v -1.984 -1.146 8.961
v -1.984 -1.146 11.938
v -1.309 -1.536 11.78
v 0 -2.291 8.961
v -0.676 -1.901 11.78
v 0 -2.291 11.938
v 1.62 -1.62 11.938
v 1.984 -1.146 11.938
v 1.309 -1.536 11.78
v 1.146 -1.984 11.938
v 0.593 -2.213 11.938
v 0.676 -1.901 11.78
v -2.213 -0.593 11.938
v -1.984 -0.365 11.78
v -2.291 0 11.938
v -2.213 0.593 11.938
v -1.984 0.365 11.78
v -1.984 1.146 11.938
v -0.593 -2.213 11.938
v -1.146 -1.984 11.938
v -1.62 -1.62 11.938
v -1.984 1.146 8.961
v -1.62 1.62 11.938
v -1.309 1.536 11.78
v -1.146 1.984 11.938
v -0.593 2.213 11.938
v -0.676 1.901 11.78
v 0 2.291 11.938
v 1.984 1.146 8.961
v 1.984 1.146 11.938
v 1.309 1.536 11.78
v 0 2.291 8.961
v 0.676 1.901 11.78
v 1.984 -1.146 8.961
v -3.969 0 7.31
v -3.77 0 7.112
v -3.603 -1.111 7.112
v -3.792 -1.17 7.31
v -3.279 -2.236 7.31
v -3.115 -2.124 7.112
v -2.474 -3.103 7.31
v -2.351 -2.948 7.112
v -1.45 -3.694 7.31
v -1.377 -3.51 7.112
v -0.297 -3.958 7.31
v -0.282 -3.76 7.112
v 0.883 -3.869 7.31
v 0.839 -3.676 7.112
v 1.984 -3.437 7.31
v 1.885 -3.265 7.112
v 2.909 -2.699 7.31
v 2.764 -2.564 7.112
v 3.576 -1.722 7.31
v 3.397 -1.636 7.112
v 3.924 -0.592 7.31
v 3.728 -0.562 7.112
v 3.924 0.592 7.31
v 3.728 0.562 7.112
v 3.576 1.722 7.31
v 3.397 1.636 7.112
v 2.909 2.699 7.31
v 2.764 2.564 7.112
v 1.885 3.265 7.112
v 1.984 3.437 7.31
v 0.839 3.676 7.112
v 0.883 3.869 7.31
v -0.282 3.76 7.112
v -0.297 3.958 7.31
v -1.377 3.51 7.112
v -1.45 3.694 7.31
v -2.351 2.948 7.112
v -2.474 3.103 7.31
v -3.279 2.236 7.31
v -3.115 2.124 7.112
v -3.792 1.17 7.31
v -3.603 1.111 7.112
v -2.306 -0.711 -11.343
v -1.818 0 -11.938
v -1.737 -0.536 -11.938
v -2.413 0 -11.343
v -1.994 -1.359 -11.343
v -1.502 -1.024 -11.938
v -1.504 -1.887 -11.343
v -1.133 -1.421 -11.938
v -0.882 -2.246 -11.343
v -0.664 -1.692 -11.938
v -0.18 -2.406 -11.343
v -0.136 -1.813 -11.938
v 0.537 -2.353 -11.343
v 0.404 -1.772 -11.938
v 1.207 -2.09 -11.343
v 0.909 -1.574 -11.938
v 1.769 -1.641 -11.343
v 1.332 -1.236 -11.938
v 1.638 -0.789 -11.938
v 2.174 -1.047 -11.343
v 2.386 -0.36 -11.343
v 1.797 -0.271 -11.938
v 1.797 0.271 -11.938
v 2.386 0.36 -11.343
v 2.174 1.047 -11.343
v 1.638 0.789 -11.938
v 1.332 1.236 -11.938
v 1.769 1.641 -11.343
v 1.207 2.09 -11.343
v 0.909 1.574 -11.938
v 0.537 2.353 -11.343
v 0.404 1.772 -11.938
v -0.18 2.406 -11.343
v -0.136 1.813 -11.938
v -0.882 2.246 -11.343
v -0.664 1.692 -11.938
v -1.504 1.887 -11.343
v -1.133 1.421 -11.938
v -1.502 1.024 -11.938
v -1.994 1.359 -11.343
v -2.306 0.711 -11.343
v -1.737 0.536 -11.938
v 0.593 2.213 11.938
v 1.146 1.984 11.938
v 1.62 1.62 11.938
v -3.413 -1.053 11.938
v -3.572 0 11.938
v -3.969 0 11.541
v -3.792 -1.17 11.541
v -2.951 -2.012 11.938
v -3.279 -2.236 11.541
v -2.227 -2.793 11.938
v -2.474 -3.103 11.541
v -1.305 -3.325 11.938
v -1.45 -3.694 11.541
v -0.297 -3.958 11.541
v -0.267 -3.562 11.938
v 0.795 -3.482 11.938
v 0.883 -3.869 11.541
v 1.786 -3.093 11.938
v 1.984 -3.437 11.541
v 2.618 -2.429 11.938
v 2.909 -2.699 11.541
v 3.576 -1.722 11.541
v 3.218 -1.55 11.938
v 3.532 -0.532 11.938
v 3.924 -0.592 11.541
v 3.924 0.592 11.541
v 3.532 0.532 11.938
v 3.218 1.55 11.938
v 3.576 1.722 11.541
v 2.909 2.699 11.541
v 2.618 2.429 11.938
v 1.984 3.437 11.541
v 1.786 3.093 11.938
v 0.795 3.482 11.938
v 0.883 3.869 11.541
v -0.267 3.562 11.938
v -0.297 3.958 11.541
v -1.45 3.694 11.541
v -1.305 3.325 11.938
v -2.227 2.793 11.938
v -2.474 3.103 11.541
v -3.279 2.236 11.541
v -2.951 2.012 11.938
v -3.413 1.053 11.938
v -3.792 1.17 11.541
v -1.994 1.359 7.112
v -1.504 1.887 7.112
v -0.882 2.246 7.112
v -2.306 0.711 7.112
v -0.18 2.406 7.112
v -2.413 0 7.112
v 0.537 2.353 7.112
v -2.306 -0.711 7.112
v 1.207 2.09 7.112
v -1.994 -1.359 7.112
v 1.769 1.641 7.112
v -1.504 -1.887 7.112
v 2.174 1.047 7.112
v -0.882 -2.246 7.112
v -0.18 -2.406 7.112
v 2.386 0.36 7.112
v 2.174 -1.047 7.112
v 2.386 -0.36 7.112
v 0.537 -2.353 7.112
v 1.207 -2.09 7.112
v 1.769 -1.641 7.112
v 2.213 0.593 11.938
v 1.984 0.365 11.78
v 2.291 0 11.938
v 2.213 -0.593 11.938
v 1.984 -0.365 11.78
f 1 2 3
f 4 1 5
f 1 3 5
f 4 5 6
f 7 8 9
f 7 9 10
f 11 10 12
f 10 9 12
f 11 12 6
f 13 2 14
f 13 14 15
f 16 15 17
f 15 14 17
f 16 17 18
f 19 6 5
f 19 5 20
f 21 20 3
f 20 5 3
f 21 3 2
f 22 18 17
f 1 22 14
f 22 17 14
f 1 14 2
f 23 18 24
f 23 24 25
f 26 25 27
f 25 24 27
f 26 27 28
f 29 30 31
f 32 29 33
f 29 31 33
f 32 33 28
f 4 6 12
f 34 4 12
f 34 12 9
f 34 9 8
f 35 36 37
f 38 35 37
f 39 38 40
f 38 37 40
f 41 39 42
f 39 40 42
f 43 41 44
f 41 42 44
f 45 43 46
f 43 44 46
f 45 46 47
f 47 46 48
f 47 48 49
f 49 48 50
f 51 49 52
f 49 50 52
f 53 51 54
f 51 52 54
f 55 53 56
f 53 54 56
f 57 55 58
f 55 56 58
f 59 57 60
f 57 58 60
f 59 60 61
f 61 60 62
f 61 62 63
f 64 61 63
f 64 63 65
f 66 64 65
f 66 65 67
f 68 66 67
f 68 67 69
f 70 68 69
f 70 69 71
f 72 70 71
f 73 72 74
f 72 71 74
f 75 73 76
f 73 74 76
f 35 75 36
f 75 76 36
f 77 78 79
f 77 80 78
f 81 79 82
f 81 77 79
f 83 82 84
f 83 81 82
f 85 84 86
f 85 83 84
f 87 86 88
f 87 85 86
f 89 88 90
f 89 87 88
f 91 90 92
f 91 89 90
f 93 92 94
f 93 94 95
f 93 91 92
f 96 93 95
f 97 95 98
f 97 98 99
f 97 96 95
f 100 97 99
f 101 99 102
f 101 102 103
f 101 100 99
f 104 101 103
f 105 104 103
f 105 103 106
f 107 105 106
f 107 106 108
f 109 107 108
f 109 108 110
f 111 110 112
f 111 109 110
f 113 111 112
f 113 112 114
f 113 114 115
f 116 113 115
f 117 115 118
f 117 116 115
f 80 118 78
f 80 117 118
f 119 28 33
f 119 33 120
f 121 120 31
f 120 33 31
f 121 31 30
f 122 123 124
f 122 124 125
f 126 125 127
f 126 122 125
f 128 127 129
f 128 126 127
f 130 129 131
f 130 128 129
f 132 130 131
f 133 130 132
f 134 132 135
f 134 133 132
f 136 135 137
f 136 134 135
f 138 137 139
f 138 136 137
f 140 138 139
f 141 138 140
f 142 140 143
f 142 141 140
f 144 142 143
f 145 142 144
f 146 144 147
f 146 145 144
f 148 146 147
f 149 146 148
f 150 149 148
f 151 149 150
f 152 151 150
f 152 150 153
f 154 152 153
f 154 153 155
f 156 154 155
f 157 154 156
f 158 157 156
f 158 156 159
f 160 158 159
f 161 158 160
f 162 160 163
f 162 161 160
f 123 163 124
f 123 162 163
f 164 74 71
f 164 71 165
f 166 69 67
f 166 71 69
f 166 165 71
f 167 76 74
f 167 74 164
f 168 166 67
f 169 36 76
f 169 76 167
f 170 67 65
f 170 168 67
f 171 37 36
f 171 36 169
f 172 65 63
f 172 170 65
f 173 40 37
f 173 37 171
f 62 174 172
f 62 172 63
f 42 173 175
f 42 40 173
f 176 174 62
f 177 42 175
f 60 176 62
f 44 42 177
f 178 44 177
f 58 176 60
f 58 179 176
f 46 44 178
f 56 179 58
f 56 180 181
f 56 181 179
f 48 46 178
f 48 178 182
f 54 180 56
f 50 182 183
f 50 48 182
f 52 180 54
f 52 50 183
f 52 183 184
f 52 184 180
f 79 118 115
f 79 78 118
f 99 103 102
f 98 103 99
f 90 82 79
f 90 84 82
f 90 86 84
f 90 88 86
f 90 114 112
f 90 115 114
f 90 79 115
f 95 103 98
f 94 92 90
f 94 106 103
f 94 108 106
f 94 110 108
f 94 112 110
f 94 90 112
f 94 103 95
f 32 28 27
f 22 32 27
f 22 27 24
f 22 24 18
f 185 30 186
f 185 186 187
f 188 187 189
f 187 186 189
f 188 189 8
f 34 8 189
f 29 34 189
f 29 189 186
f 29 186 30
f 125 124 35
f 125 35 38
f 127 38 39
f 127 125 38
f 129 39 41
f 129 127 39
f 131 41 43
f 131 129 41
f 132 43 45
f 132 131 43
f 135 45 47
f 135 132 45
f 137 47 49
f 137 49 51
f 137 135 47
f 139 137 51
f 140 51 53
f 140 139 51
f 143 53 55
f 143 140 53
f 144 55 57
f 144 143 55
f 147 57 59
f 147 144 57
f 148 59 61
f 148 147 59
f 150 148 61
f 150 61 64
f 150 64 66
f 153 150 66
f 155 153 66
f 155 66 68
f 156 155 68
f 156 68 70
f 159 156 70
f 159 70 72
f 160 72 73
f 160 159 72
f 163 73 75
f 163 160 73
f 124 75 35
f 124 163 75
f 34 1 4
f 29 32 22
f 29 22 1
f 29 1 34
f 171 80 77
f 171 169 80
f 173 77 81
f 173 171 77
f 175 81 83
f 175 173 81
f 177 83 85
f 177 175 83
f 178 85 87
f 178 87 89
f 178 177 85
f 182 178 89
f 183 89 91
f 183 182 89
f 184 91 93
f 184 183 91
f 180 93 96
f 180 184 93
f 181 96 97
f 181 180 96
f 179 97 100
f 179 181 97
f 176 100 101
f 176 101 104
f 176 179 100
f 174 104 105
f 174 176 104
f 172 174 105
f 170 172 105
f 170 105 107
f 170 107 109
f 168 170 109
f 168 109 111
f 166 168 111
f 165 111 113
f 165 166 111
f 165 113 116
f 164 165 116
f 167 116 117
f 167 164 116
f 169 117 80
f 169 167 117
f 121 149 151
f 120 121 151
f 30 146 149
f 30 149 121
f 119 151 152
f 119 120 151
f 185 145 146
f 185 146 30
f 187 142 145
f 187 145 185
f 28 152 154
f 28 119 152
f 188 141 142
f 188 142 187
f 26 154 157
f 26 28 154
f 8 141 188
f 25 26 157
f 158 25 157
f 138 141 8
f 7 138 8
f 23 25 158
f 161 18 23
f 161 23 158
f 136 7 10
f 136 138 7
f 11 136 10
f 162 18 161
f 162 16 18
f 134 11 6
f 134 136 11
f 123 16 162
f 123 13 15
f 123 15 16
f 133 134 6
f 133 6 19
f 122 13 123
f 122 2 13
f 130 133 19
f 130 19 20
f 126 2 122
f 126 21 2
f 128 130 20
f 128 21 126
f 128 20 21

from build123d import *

# Parameters (mm, degrees)
CUT_EXTRUDE1_DEPTH = 2.9765625
CHAMFER1_SIZE      = 0.396875
CHAMFER2_SIZE      = 0.1984375


with BuildPart() as part:
    # Sketch2 → Revolve1 (revolve)
    with BuildSketch(Plane(origin=(0, 0, 0), x_dir=(0, 0, -1), z_dir=(1, 0, 0))):
        Polygon((11.938, 1.8176875), (11.3426875, 2.413), (-7.112, 2.413), (-7.112, 3.96875), (-11.938, 3.96875), (-11.938, 0), (11.938, 0), align=None)
    revolve(axis=Axis((0, 0, -11.938), (0, 0, 1)))

    # Sketch4 → Cut-Extrude1 (cut)
    with BuildSketch(Plane.XY.offset(11.938)):
        Polygon((0, 2.291358881), (-1.984375, 1.14567944), (-1.984375, -1.14567944), (0, -2.291358881), (1.984375, -1.14567944), (1.984375, 1.14567944), align=None)
    extrude(amount=-CUT_EXTRUDE1_DEPTH, mode=Mode.SUBTRACT)

    # Cut-Extrude2 cone 1 section (through the dimple's axis) → Cut-Extrude2 (revolve, cut)
    with BuildSketch(Plane(origin=(0, 0, 11.938), x_dir=(0, -1, 0), z_dir=(1, 0, 0))):
        Polygon((0, 0), (2.291358881, 0), (0, 1.322916667), align=None)
    revolve(axis=Axis((0, 0, 11.938), (0, 0, -1)), mode=Mode.SUBTRACT)

    # Chamfer1
    chamfer1_edges = [part.edges().sort_by_distance(p)[0] for p in [
        (0, -3.96875, 11.938),
    ]]
    chamfer(chamfer1_edges, length=CHAMFER1_SIZE)

    # Chamfer2
    chamfer2_edges = [part.edges().sort_by_distance(p)[0] for p in [
        (0, -3.96875, 7.112),
    ]]
    chamfer(chamfer2_edges, length=CHAMFER2_SIZE)


solid = part.part
